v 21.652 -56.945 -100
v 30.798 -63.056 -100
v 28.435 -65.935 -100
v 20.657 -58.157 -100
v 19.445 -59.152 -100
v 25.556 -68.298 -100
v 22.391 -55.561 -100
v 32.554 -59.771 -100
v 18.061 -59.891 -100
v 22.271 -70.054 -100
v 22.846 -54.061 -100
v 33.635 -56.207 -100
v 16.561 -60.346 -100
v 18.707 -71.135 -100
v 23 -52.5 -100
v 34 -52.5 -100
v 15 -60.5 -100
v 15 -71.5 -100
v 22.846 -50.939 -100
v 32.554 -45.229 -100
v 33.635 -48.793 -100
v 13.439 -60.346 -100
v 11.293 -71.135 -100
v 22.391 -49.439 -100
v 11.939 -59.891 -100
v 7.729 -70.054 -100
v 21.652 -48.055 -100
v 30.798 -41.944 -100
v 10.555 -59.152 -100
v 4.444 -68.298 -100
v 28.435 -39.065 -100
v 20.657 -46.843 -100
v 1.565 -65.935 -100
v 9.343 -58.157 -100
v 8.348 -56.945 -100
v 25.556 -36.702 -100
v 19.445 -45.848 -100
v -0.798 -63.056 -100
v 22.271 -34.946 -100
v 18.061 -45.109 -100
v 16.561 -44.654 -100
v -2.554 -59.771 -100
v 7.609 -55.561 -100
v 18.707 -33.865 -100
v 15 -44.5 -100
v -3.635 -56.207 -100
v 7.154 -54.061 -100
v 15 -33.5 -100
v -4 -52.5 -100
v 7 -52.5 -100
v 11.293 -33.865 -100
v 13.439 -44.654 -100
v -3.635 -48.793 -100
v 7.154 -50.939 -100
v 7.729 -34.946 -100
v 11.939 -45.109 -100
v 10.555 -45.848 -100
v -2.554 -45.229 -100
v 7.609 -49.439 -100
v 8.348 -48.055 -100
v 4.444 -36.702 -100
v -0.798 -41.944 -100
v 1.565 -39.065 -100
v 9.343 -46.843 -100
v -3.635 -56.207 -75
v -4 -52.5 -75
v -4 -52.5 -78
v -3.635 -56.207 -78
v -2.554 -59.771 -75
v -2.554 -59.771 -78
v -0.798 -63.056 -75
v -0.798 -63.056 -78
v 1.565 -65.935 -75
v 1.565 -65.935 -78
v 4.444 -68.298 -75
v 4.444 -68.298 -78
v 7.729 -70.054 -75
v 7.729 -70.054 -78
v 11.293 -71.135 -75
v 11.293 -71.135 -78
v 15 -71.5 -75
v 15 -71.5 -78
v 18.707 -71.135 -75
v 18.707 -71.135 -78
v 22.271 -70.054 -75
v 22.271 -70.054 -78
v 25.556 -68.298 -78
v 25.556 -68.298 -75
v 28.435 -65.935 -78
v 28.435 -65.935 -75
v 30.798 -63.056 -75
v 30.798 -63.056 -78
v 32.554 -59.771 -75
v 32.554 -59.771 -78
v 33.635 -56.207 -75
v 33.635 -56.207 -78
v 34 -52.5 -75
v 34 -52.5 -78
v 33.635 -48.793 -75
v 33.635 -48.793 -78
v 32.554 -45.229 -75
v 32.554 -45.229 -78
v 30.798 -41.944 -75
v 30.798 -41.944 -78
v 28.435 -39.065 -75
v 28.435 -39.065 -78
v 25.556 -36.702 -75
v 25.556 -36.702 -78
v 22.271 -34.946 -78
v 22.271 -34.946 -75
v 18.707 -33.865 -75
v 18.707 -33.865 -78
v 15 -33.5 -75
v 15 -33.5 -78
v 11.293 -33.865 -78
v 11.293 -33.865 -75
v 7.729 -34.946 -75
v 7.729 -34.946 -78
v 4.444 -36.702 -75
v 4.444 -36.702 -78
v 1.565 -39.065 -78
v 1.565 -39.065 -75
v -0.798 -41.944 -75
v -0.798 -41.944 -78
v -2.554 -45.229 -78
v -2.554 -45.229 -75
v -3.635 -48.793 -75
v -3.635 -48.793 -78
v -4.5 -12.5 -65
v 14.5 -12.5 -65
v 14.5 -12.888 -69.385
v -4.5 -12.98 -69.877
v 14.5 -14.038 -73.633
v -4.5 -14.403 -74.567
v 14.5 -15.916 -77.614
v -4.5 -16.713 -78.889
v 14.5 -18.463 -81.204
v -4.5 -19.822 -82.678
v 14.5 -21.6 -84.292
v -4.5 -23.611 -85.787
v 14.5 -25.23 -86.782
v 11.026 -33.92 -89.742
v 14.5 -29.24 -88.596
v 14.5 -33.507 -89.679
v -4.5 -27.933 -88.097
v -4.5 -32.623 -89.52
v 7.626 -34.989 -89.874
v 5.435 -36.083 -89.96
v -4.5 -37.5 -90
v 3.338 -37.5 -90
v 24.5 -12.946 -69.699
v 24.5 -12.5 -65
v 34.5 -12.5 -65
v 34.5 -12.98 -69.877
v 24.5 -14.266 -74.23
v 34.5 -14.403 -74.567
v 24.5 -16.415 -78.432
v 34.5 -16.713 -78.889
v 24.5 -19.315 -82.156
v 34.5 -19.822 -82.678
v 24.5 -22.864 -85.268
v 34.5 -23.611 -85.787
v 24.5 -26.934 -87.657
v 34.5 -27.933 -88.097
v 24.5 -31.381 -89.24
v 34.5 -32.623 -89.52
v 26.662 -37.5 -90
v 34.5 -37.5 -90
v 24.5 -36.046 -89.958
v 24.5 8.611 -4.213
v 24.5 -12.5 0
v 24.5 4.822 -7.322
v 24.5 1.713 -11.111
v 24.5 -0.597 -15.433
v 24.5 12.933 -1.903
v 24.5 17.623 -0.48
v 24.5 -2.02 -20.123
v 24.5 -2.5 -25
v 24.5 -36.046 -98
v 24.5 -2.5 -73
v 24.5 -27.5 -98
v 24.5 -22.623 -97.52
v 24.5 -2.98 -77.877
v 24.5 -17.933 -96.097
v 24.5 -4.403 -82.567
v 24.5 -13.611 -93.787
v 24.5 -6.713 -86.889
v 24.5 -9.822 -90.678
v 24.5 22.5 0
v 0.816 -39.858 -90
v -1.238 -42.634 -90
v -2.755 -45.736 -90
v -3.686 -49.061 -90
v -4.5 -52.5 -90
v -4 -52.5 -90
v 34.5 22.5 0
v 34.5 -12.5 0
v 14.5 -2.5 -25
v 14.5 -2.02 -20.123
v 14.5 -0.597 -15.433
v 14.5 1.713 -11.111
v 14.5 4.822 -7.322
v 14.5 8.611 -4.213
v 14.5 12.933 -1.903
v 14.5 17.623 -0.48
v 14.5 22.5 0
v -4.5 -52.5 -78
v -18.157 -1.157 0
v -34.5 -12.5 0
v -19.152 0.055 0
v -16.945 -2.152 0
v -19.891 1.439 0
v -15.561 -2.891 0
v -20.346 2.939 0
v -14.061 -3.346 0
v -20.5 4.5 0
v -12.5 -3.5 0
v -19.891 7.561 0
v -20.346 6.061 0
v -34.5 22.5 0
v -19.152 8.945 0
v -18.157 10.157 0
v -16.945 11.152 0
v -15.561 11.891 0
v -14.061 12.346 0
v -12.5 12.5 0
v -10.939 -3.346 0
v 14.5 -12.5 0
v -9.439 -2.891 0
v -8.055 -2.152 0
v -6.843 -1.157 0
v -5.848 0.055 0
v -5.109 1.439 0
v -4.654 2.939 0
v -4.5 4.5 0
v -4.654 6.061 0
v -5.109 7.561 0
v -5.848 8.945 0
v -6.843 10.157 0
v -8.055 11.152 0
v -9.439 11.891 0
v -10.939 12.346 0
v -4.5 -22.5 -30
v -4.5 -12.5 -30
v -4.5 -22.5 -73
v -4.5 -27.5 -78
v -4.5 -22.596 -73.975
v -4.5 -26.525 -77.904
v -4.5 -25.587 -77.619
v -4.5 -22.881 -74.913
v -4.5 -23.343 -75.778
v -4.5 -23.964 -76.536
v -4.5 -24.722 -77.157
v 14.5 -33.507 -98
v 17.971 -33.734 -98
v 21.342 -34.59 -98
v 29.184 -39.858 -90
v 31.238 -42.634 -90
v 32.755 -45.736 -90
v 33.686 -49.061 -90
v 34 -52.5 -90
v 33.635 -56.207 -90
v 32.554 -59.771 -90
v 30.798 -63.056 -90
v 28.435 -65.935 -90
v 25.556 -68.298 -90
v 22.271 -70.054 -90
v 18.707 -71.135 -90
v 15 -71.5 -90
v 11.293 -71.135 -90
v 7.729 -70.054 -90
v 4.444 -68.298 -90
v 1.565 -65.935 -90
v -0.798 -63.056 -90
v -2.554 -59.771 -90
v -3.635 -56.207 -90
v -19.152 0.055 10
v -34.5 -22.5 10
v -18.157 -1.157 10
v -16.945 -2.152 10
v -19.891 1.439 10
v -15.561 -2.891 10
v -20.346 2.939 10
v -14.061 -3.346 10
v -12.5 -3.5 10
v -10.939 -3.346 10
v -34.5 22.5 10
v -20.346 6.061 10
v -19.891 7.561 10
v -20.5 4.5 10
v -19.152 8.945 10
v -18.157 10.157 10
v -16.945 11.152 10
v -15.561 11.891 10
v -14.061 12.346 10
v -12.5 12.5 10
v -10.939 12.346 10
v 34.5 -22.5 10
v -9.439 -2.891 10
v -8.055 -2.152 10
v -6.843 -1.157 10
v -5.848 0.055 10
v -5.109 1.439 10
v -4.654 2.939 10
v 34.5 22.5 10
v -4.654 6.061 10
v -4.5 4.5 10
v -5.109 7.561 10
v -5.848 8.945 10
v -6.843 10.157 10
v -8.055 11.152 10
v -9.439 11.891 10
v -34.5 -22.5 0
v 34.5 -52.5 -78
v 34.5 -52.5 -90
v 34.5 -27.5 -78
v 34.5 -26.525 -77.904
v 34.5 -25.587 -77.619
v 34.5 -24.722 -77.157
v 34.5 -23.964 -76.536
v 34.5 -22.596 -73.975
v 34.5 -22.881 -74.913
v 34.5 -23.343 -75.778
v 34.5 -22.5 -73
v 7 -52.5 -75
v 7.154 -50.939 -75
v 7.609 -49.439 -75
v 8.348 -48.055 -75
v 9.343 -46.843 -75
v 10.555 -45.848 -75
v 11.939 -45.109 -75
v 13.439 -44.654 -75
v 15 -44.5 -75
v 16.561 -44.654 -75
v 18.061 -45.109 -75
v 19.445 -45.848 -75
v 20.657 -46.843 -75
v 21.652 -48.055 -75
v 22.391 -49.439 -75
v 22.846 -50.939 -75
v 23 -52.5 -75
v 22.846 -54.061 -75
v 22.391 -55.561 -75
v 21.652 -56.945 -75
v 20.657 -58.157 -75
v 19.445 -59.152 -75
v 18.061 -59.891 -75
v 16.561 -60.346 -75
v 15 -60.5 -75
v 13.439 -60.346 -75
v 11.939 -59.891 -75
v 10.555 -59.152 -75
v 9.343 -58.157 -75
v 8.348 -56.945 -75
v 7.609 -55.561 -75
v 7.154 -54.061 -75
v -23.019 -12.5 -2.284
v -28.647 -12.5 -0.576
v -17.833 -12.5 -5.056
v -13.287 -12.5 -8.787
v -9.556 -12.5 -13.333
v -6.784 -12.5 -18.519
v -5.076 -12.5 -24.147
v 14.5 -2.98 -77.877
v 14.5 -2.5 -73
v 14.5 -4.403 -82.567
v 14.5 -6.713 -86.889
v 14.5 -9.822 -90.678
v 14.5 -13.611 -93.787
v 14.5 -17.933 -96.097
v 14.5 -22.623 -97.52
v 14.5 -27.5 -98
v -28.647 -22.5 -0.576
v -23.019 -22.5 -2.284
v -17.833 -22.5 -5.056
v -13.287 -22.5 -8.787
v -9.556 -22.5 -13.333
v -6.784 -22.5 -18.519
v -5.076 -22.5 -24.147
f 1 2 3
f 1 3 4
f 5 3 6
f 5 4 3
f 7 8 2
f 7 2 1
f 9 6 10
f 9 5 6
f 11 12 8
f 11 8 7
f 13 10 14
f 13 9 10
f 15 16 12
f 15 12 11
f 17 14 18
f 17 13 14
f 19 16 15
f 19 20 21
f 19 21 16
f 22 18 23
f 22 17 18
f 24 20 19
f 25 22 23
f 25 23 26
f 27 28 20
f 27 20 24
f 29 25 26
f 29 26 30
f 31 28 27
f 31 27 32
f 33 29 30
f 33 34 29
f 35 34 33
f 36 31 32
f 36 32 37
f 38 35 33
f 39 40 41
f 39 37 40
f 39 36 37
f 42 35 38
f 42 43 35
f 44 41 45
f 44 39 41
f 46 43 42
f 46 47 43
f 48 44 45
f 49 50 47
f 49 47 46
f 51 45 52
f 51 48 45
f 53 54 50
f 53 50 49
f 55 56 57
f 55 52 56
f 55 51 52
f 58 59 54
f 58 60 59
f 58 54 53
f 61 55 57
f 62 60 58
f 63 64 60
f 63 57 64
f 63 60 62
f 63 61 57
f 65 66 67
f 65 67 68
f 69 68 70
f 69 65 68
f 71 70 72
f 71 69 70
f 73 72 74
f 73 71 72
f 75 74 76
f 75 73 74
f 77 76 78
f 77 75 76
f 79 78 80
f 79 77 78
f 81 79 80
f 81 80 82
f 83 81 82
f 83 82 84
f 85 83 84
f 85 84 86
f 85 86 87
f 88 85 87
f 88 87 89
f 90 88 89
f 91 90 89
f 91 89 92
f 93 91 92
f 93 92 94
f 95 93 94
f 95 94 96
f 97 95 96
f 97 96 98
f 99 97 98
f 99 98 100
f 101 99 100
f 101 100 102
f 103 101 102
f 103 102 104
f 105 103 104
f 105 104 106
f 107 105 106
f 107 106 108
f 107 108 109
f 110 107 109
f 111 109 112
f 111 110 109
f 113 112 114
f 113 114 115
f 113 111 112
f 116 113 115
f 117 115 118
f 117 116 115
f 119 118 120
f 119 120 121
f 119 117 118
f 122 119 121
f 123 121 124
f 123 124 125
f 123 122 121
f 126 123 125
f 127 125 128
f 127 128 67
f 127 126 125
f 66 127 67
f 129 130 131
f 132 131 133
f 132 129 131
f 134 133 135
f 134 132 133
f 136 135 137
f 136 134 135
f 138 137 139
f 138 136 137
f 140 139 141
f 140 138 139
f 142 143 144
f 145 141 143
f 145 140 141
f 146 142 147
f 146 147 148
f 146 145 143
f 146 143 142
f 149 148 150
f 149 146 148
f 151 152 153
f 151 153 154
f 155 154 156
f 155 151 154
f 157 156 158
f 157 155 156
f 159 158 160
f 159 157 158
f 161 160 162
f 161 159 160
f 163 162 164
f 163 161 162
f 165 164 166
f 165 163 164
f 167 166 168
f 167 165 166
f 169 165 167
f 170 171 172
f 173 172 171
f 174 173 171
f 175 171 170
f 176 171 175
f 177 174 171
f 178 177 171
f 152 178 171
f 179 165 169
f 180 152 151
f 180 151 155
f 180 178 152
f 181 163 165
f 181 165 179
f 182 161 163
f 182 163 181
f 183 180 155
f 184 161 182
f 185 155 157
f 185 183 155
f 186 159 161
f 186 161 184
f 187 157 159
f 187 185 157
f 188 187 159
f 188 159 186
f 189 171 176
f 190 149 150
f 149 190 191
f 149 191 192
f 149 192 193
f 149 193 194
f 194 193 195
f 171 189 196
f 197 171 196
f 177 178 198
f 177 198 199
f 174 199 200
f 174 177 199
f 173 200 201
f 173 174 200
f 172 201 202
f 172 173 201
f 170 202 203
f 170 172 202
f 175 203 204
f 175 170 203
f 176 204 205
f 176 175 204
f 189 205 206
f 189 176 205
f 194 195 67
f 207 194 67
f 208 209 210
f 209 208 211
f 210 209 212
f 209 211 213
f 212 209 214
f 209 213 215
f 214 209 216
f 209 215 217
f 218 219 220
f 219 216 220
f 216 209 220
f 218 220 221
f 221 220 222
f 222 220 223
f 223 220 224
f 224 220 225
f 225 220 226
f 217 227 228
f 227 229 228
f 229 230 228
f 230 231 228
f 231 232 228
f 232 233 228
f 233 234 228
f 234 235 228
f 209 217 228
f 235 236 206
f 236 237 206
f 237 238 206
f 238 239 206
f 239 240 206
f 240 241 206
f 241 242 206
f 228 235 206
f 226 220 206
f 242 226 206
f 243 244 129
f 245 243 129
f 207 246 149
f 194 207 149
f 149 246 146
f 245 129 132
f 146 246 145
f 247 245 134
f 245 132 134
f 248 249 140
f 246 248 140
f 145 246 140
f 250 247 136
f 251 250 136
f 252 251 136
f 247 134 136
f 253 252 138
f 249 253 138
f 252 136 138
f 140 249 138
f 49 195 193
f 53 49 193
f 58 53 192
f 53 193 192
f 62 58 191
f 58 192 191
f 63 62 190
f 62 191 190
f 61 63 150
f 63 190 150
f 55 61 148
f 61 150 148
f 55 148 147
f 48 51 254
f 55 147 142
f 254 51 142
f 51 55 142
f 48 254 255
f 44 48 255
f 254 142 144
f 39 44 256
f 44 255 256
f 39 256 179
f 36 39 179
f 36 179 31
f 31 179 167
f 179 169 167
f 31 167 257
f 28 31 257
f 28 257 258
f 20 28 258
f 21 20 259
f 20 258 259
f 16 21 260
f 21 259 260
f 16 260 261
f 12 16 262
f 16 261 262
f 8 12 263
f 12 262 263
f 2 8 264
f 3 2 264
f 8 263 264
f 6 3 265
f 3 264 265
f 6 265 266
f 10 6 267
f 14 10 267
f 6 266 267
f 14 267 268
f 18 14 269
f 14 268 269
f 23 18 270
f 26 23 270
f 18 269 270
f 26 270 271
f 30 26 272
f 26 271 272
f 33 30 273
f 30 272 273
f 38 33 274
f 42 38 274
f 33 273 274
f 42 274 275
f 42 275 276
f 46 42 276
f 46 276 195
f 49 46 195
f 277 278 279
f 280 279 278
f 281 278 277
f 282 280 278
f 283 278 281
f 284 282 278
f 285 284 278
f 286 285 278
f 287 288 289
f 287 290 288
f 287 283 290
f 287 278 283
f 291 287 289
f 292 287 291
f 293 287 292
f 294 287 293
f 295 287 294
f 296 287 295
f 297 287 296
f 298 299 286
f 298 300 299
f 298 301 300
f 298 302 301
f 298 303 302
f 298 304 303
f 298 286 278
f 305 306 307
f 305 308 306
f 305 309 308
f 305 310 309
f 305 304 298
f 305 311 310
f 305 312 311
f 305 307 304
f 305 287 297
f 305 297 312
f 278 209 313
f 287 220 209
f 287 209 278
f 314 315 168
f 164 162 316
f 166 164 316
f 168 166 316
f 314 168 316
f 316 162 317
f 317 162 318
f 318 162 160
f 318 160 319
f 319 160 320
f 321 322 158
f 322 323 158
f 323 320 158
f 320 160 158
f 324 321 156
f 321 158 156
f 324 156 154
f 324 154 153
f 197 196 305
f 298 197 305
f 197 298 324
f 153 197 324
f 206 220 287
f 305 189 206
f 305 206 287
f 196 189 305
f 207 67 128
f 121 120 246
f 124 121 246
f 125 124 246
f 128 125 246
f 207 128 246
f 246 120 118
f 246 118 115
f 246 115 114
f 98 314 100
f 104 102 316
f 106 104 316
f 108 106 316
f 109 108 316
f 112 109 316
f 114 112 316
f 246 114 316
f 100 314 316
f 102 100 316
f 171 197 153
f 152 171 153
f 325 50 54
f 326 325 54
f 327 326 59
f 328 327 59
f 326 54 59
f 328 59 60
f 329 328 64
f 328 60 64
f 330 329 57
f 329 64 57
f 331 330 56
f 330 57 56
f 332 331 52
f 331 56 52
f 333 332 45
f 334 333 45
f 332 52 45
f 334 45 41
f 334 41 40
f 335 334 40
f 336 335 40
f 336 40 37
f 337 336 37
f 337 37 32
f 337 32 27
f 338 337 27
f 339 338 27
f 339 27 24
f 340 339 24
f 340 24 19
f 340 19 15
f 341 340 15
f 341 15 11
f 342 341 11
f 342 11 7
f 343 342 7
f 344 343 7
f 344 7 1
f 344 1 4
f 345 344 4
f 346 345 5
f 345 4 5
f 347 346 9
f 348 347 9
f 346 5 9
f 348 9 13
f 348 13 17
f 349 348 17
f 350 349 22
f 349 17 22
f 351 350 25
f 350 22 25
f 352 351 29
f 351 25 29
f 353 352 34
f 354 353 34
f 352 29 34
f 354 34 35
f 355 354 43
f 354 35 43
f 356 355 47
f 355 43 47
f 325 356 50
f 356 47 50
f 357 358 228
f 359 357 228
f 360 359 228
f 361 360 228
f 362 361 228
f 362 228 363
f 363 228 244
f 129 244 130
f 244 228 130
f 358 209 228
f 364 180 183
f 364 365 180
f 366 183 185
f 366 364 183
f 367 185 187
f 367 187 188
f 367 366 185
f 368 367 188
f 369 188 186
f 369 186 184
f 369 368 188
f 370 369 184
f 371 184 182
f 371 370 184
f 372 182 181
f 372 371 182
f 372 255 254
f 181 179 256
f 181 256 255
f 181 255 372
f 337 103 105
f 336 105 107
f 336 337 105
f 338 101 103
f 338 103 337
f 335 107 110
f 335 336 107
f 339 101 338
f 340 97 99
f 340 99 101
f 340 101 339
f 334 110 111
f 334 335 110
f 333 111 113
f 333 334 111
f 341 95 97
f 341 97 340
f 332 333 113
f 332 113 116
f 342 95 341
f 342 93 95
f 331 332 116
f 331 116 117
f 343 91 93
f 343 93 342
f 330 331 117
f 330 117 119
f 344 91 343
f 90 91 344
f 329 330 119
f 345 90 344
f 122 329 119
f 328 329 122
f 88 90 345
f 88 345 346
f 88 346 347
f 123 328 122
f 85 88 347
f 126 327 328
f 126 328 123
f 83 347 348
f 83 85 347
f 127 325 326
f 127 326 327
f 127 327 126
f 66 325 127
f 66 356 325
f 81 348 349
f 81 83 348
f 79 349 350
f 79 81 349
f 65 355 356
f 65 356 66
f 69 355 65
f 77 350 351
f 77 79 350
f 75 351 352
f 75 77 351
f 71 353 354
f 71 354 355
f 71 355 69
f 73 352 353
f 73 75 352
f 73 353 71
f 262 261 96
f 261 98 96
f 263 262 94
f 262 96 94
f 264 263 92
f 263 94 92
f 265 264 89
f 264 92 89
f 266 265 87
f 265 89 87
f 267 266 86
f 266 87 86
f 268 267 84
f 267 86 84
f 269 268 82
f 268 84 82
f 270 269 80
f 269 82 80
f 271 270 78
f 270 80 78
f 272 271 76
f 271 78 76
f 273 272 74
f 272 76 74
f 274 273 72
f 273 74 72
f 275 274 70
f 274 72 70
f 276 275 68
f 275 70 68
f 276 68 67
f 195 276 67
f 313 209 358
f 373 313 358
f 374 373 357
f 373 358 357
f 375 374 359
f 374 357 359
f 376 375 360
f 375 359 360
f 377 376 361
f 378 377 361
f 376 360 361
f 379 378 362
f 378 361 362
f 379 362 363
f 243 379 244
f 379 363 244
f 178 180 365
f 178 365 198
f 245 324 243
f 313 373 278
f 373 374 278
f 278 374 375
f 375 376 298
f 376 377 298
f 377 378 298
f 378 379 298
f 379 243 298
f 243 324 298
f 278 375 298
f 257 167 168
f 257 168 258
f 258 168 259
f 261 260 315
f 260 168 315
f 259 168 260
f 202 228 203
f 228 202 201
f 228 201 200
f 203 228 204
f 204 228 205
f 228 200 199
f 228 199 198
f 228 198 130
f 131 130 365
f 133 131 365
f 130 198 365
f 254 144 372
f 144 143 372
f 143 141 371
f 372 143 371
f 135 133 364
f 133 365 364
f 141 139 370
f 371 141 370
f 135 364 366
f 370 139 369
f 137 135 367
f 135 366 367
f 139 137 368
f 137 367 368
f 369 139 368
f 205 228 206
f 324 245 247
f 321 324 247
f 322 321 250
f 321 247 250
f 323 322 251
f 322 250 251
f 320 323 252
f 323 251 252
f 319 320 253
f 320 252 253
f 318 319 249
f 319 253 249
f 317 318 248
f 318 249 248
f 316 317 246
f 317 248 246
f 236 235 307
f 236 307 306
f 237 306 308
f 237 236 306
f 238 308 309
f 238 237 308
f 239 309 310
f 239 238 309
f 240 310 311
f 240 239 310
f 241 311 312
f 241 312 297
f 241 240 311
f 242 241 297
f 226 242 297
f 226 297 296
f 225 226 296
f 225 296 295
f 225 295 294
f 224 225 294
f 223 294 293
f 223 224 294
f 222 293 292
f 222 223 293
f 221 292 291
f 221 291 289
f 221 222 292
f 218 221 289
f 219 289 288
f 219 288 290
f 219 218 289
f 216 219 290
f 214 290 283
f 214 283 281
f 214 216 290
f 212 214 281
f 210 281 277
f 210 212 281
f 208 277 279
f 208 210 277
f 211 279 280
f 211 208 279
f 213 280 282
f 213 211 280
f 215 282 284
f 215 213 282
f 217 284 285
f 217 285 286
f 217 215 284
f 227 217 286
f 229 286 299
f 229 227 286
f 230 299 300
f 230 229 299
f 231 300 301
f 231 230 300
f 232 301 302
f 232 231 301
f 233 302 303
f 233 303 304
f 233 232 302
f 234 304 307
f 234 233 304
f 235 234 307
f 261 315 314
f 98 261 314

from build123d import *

# Parameters (mm, degrees)
IZIM1_W                     = 69
IZIM1_H                     = 45
IZIM1_R                     = 8
Y_KSEKLIK_EKSTR_ZYON1_DEPTH = 10
Y_KSEKLIK_EKSTR_ZYON2_DEPTH = 69
RADYUS1_R                   = 5
KES_EKSTR_ZYON2_DEPTH       = 57
IZIM6_R                     = 19
Y_KSEKLIK_EKSTR_ZYON3_DEPTH = 10
Y_KSEKLIK_EKSTR_ZYON4_START = 3
IZIM7_R                     = 19
Y_KSEKLIK_EKSTR_ZYON4_DEPTH = 3
Y_KSEKLIK_EKSTR_ZYON5_DEPTH = 10
KES_EKSTR_ZYON3_REACH       = 137.656
IZIM10_R                    = 8
RADYUS3_R                   = 25
RADYUS4_R                   = 25


with BuildPart() as part:
    # Çizim1 → Yükseklik-Ekstrüzyon1 (new body)
    with BuildSketch(Plane.XY):
        Rectangle(IZIM1_W, IZIM1_H)
        with Locations((-12.5, 4.5)):
            Circle(IZIM1_R, mode=Mode.SUBTRACT)
    extrude(amount=Y_KSEKLIK_EKSTR_ZYON1_DEPTH)

    # Çizim2 → Yükseklik-Ekstrüzyon2 (add)
    with BuildSketch(Plane(origin=(34.5, 0, 0), x_dir=(0, 0, -1), z_dir=(1, 0, 0))):
        Polygon((0, -12.5), (90, -12.5), (90, -52.5), (78, -52.5), (78, -22.5), (0, -22.5), align=None)
    extrude(amount=-Y_KSEKLIK_EKSTR_ZYON2_DEPTH)

    # Radyus1
    radyus1_edges = [part.edges().sort_by_distance(p)[0] for p in [
        (0, -22.5, -78),
    ]]
    fillet(radyus1_edges, radius=RADYUS1_R)

    # Çizim4 → Kes-Ekstrüzyon2 (cut)
    with BuildSketch(Plane(origin=(0, -12.5, 0), x_dir=(1, 0, 0), z_dir=(0, 1, 0))):
        with BuildLine():
            ThreePointArc((-34.5, 0), (-13.286796564, 8.786796564), (-4.5, 30))
            Line((-4.5, 30), (-4.5, 90))
            Line((-4.5, 90), (-34.5, 90))
            Line((-34.5, 90), (-34.5, 0))
        make_face()
        with BuildLine():
            ThreePointArc((-62.385076525, 41.064470488), (-59.318683634, 13.146723088), (-34.5, 0))
            Line((-34.5, 0), (-34.5, 90))
            Line((-34.5, 90), (-58.233748988, 48.34963648))
            Line((-58.233748988, 48.34963648), (-62.385076525, 41.064470488))
        make_face()
    extrude(amount=-KES_EKSTR_ZYON2_DEPTH, mode=Mode.SUBTRACT)

    # Çizim6 → Yükseklik-Ekstrüzyon3 (add)
    with BuildSketch(Plane(origin=(0, 0, -90), x_dir=(-1, 0, 0), z_dir=(0, 0, -1))):
        with Locations((-15, -52.5)):
            Circle(IZIM6_R)
    extrude(amount=Y_KSEKLIK_EKSTR_ZYON3_DEPTH)

    # Çizim7 → Yükseklik-Ekstrüzyon4 (add)
    with BuildSketch(Plane.XY.offset(-78).offset(Y_KSEKLIK_EKSTR_ZYON4_START)):
        with Locations(Location((15, -52.5, 0), (0, 0, 180))):
            Circle(IZIM7_R)
    extrude(amount=-Y_KSEKLIK_EKSTR_ZYON4_DEPTH)

    # loft from a face of the part (loft1)
    loft([part.faces().sort_by_distance((15, -60.56385045, -90))[0], part.faces().sort_by_distance((15, -60.56385045, -78))[0]])

    # Çizim15 → Yükseklik-Ekstrüzyon5 (add)
    with BuildSketch(Plane(origin=(24.5, 0, 0), x_dir=(0, 0, -1), z_dir=(1, 0, 0))):
        with BuildLine():
            Line((0, 22.5), (0, -12.5))
            Line((0, -12.5), (90, -12.5))
            Line((90, -12.5), (90, -52.5))
            Line((90, -52.5), (98, -52.5))
            Line((98, -52.5), (98, -46.937300736))
            Line((98, -46.937300736), (98, -2.5))
            Line((98, -2.5), (25, -2.5))
            ThreePointArc((25, -2.5), (7.32233047, 4.82233047), (0, 22.5))
        make_face()
    extrude(amount=-Y_KSEKLIK_EKSTR_ZYON5_DEPTH)

    # Çizim10 → Kes-Ekstrüzyon3 (cut, up to next)
    with BuildSketch(Plane(origin=(0, 0, -100), x_dir=(-1, 0, 0), z_dir=(0, 0, -1)), mode=Mode.PRIVATE) as kes_ekstr_zyon3_sk1:
        with Locations((-15, -52.5)):
            Circle(IZIM10_R)
    kes_ekstr_zyon3_tool1 = extrude(kes_ekstr_zyon3_sk1.sketch, amount=-KES_EKSTR_ZYON3_REACH, mode=Mode.PRIVATE) & part.part
    add(kes_ekstr_zyon3_tool1.solids().sort_by_distance((15, -52.5, -100))[0], mode=Mode.SUBTRACT)

    # Radyus3
    radyus3_edges = [part.edges().sort_by_distance(p)[0] for p in [
        (19.5, -2.5, -98),
    ]]
    fillet(radyus3_edges, radius=RADYUS3_R)

    # Radyus4
    radyus4_edges = [part.edges().sort_by_distance(p)[0] for p in [
        (29.5, -12.5, -90),
        (5, -12.5, -90),
    ]]
    fillet(radyus4_edges, radius=RADYUS4_R)


solid = part.part
